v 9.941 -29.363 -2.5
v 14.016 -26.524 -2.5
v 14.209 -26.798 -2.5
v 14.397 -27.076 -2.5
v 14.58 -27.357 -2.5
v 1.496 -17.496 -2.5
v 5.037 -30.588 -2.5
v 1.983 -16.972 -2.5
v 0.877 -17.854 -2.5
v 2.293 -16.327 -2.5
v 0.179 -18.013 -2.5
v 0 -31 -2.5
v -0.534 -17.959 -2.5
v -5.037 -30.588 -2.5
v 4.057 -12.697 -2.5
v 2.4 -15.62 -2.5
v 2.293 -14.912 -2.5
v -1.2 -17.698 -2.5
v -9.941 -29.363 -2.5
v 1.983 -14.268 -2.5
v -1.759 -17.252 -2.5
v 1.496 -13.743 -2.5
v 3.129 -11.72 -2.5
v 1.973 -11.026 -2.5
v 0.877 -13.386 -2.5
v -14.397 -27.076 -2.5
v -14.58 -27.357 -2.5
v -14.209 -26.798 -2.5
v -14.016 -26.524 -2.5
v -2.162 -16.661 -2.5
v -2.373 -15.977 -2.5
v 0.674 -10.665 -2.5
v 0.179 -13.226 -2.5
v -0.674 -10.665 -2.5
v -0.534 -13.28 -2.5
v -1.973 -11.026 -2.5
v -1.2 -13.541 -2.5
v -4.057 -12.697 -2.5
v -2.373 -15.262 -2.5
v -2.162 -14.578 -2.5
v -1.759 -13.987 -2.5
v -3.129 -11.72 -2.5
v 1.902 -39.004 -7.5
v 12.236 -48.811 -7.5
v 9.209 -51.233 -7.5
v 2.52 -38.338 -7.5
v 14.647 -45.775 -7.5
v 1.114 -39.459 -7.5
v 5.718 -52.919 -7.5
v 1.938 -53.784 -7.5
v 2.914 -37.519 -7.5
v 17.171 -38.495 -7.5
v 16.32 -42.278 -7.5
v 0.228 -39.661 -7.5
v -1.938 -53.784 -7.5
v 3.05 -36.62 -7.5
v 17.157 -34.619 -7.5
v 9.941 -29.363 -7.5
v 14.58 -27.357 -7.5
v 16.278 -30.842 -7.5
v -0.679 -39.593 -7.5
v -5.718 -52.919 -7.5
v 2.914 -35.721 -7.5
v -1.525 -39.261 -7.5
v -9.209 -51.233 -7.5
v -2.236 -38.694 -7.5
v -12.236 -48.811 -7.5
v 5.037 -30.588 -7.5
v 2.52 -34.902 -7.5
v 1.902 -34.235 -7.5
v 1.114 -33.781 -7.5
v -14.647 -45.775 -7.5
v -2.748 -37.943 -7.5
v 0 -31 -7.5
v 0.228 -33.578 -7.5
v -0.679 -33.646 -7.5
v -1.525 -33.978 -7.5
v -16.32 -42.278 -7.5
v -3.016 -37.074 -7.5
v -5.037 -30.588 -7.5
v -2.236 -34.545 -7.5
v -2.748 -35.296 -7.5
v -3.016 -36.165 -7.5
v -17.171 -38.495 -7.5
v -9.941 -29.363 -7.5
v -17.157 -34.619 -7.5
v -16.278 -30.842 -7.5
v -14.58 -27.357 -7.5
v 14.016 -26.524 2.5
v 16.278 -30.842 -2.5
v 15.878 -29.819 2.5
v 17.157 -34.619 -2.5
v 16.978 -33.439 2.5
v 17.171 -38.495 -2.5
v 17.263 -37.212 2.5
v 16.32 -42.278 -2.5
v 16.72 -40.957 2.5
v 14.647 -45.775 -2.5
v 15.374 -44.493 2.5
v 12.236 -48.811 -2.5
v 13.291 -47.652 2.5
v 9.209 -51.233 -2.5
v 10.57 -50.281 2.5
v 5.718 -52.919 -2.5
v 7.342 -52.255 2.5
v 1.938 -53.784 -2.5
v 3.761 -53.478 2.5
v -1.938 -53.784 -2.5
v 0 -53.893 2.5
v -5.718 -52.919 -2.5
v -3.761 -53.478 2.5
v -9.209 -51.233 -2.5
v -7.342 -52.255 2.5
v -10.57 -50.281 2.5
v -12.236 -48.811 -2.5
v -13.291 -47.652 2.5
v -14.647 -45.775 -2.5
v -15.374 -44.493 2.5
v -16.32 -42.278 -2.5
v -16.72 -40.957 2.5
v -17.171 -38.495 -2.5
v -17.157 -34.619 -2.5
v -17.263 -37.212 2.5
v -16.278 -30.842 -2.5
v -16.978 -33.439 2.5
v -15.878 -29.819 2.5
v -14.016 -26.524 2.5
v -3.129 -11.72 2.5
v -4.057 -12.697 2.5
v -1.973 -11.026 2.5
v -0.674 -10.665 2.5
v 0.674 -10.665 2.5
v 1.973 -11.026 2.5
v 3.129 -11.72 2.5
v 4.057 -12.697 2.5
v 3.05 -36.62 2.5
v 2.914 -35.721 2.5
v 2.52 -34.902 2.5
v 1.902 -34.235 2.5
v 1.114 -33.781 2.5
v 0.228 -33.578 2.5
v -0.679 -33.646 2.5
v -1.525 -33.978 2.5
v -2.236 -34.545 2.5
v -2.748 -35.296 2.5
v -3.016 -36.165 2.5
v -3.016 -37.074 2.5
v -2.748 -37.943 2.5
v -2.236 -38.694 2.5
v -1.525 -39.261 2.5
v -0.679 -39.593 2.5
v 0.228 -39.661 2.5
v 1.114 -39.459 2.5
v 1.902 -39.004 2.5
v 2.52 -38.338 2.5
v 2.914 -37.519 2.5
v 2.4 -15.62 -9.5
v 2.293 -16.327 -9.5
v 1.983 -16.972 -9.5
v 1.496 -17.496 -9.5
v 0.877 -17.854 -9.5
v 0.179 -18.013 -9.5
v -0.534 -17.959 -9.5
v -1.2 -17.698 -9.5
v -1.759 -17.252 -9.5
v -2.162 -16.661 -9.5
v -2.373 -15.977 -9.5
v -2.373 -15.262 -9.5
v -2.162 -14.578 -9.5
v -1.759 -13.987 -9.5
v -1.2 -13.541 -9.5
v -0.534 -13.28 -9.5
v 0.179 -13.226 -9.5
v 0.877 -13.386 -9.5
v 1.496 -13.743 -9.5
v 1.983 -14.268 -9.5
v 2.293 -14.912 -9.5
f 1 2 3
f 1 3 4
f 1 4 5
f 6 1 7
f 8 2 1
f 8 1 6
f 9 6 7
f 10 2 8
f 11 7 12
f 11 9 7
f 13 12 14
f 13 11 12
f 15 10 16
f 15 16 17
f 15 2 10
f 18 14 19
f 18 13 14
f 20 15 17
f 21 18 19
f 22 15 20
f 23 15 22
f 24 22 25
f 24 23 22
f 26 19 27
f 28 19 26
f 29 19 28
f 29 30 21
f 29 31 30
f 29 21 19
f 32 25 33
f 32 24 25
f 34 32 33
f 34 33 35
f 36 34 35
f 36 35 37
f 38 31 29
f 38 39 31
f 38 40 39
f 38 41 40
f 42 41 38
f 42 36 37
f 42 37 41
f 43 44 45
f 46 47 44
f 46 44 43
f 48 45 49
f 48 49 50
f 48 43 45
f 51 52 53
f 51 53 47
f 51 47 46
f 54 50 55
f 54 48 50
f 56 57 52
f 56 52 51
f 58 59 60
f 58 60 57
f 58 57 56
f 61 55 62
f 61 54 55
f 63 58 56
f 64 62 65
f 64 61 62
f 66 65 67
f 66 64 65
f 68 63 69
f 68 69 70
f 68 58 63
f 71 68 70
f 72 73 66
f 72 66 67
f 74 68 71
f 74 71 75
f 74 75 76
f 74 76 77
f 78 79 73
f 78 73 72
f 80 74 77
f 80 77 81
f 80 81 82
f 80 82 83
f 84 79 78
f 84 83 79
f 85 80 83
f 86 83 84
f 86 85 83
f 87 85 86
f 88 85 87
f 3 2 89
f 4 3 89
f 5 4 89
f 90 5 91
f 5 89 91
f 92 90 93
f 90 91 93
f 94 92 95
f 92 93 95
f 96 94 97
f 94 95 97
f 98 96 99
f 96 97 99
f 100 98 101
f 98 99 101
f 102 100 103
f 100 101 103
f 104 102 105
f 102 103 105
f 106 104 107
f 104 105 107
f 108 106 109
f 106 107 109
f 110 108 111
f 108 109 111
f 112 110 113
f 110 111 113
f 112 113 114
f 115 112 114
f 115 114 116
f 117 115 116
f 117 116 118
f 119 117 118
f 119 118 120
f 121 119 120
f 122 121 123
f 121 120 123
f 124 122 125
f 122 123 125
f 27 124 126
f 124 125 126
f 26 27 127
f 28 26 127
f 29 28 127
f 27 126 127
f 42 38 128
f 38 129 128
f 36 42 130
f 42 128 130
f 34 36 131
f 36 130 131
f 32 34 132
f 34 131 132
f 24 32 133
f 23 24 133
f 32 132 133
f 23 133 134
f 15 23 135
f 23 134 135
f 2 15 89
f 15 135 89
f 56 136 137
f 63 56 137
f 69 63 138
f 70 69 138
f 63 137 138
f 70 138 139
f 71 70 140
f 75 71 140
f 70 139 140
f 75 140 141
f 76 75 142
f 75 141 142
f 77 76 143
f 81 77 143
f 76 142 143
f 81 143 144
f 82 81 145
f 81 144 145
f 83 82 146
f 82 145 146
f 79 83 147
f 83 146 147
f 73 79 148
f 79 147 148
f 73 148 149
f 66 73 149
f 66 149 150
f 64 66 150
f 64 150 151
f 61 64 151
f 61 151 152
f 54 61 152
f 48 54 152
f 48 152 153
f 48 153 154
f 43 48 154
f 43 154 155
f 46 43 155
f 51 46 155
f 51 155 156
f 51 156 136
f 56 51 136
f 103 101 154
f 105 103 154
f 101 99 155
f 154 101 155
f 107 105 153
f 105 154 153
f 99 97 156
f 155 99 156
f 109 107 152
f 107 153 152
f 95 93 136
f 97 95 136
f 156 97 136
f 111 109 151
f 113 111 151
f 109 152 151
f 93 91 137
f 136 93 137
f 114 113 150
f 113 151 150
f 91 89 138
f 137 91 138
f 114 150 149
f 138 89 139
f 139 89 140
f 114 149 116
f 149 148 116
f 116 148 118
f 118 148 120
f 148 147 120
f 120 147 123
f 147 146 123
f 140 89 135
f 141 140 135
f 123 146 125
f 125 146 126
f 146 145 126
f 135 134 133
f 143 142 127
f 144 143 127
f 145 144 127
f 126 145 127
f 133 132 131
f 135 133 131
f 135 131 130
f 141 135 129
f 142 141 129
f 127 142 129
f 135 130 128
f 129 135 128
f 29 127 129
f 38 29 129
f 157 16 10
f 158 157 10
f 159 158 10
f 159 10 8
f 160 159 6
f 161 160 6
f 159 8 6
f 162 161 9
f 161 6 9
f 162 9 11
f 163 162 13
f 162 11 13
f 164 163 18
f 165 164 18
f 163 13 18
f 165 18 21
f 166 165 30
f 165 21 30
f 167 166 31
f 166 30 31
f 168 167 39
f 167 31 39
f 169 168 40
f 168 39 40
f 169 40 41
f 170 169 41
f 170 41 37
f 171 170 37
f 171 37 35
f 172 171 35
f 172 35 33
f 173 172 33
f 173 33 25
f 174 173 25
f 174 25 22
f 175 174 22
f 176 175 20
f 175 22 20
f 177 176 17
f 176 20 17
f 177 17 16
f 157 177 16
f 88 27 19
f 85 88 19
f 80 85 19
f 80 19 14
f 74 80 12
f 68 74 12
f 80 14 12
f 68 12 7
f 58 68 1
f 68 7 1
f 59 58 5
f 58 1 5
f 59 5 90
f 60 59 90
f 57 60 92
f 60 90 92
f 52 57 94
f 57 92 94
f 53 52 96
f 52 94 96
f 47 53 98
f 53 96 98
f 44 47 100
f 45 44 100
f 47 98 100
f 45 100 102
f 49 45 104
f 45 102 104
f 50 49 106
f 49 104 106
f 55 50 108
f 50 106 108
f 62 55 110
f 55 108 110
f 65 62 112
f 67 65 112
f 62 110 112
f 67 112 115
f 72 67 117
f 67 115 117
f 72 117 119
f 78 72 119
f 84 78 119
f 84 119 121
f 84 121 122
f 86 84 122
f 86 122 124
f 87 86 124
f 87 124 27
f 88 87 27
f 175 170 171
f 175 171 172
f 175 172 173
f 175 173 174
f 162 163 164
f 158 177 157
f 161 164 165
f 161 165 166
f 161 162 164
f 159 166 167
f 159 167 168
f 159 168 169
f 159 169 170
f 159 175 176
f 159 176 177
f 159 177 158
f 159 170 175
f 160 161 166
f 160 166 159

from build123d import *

# Parameters (mm, degrees)
EXTRUDE1_DEPTH      = 2.5
EXTRUDE2_DEPTH      = 5
SKETCH4_R           = 3.05
EXTRUDE4_DEPTH      = 58.470101426
SKETCH5_R           = 2.4
BOSS_EXTRUDE1_DEPTH = 7


with BuildPart() as part:
    # Sketch1 → Extrude1 (new, symmetric)
    with BuildSketch(Plane.XY):
        with BuildLine():
            Line((-14.016148368, -26.524471435), (-4.057181828, -12.697462951))
            ThreePointArc((-4.057181828, -12.697462951), (0, -10.619666847), (4.057181828, -12.697462951))
            Line((4.057181828, -12.697462951), (14.016148368, -26.524471435))
            ThreePointArc((14.016148368, -26.524471435), (0, -53.892923213), (-14.016148368, -26.524471435))
        make_face()
    extrude(amount=EXTRUDE1_DEPTH, both=True)

    # Sketch2 → Extrude2 (add)
    with BuildSketch(Plane(origin=(0, 0, -2.5), x_dir=(-1, 0, 0), z_dir=(0, 0, -1))):
        with BuildLine():
            ThreePointArc((-14.57995219, -27.357357221), (0, -53.892923213), (14.57995219, -27.357357221))
            ThreePointArc((14.57995219, -27.357357221), (0, -31), (-14.57995219, -27.357357221))
        make_face()
    extrude(amount=EXTRUDE2_DEPTH)

    # Sketch4 → Extrude4 (cut, through all)
    with BuildSketch(Plane.XY.offset(2.5)):
        with Locations((0, -36.619666847)):
            Circle(SKETCH4_R)
    extrude(amount=-EXTRUDE4_DEPTH, mode=Mode.SUBTRACT)

    # Sketch5 → Boss-Extrude1 (add)
    with BuildSketch(Plane(origin=(0, 0, -2.5), x_dir=(-1, 0, 0), z_dir=(0, 0, -1))):
        with Locations(Location((0, -15.619666847, 0), (0, 0, 180))):
            Circle(SKETCH5_R)
    extrude(amount=BOSS_EXTRUDE1_DEPTH)


solid = part.part
